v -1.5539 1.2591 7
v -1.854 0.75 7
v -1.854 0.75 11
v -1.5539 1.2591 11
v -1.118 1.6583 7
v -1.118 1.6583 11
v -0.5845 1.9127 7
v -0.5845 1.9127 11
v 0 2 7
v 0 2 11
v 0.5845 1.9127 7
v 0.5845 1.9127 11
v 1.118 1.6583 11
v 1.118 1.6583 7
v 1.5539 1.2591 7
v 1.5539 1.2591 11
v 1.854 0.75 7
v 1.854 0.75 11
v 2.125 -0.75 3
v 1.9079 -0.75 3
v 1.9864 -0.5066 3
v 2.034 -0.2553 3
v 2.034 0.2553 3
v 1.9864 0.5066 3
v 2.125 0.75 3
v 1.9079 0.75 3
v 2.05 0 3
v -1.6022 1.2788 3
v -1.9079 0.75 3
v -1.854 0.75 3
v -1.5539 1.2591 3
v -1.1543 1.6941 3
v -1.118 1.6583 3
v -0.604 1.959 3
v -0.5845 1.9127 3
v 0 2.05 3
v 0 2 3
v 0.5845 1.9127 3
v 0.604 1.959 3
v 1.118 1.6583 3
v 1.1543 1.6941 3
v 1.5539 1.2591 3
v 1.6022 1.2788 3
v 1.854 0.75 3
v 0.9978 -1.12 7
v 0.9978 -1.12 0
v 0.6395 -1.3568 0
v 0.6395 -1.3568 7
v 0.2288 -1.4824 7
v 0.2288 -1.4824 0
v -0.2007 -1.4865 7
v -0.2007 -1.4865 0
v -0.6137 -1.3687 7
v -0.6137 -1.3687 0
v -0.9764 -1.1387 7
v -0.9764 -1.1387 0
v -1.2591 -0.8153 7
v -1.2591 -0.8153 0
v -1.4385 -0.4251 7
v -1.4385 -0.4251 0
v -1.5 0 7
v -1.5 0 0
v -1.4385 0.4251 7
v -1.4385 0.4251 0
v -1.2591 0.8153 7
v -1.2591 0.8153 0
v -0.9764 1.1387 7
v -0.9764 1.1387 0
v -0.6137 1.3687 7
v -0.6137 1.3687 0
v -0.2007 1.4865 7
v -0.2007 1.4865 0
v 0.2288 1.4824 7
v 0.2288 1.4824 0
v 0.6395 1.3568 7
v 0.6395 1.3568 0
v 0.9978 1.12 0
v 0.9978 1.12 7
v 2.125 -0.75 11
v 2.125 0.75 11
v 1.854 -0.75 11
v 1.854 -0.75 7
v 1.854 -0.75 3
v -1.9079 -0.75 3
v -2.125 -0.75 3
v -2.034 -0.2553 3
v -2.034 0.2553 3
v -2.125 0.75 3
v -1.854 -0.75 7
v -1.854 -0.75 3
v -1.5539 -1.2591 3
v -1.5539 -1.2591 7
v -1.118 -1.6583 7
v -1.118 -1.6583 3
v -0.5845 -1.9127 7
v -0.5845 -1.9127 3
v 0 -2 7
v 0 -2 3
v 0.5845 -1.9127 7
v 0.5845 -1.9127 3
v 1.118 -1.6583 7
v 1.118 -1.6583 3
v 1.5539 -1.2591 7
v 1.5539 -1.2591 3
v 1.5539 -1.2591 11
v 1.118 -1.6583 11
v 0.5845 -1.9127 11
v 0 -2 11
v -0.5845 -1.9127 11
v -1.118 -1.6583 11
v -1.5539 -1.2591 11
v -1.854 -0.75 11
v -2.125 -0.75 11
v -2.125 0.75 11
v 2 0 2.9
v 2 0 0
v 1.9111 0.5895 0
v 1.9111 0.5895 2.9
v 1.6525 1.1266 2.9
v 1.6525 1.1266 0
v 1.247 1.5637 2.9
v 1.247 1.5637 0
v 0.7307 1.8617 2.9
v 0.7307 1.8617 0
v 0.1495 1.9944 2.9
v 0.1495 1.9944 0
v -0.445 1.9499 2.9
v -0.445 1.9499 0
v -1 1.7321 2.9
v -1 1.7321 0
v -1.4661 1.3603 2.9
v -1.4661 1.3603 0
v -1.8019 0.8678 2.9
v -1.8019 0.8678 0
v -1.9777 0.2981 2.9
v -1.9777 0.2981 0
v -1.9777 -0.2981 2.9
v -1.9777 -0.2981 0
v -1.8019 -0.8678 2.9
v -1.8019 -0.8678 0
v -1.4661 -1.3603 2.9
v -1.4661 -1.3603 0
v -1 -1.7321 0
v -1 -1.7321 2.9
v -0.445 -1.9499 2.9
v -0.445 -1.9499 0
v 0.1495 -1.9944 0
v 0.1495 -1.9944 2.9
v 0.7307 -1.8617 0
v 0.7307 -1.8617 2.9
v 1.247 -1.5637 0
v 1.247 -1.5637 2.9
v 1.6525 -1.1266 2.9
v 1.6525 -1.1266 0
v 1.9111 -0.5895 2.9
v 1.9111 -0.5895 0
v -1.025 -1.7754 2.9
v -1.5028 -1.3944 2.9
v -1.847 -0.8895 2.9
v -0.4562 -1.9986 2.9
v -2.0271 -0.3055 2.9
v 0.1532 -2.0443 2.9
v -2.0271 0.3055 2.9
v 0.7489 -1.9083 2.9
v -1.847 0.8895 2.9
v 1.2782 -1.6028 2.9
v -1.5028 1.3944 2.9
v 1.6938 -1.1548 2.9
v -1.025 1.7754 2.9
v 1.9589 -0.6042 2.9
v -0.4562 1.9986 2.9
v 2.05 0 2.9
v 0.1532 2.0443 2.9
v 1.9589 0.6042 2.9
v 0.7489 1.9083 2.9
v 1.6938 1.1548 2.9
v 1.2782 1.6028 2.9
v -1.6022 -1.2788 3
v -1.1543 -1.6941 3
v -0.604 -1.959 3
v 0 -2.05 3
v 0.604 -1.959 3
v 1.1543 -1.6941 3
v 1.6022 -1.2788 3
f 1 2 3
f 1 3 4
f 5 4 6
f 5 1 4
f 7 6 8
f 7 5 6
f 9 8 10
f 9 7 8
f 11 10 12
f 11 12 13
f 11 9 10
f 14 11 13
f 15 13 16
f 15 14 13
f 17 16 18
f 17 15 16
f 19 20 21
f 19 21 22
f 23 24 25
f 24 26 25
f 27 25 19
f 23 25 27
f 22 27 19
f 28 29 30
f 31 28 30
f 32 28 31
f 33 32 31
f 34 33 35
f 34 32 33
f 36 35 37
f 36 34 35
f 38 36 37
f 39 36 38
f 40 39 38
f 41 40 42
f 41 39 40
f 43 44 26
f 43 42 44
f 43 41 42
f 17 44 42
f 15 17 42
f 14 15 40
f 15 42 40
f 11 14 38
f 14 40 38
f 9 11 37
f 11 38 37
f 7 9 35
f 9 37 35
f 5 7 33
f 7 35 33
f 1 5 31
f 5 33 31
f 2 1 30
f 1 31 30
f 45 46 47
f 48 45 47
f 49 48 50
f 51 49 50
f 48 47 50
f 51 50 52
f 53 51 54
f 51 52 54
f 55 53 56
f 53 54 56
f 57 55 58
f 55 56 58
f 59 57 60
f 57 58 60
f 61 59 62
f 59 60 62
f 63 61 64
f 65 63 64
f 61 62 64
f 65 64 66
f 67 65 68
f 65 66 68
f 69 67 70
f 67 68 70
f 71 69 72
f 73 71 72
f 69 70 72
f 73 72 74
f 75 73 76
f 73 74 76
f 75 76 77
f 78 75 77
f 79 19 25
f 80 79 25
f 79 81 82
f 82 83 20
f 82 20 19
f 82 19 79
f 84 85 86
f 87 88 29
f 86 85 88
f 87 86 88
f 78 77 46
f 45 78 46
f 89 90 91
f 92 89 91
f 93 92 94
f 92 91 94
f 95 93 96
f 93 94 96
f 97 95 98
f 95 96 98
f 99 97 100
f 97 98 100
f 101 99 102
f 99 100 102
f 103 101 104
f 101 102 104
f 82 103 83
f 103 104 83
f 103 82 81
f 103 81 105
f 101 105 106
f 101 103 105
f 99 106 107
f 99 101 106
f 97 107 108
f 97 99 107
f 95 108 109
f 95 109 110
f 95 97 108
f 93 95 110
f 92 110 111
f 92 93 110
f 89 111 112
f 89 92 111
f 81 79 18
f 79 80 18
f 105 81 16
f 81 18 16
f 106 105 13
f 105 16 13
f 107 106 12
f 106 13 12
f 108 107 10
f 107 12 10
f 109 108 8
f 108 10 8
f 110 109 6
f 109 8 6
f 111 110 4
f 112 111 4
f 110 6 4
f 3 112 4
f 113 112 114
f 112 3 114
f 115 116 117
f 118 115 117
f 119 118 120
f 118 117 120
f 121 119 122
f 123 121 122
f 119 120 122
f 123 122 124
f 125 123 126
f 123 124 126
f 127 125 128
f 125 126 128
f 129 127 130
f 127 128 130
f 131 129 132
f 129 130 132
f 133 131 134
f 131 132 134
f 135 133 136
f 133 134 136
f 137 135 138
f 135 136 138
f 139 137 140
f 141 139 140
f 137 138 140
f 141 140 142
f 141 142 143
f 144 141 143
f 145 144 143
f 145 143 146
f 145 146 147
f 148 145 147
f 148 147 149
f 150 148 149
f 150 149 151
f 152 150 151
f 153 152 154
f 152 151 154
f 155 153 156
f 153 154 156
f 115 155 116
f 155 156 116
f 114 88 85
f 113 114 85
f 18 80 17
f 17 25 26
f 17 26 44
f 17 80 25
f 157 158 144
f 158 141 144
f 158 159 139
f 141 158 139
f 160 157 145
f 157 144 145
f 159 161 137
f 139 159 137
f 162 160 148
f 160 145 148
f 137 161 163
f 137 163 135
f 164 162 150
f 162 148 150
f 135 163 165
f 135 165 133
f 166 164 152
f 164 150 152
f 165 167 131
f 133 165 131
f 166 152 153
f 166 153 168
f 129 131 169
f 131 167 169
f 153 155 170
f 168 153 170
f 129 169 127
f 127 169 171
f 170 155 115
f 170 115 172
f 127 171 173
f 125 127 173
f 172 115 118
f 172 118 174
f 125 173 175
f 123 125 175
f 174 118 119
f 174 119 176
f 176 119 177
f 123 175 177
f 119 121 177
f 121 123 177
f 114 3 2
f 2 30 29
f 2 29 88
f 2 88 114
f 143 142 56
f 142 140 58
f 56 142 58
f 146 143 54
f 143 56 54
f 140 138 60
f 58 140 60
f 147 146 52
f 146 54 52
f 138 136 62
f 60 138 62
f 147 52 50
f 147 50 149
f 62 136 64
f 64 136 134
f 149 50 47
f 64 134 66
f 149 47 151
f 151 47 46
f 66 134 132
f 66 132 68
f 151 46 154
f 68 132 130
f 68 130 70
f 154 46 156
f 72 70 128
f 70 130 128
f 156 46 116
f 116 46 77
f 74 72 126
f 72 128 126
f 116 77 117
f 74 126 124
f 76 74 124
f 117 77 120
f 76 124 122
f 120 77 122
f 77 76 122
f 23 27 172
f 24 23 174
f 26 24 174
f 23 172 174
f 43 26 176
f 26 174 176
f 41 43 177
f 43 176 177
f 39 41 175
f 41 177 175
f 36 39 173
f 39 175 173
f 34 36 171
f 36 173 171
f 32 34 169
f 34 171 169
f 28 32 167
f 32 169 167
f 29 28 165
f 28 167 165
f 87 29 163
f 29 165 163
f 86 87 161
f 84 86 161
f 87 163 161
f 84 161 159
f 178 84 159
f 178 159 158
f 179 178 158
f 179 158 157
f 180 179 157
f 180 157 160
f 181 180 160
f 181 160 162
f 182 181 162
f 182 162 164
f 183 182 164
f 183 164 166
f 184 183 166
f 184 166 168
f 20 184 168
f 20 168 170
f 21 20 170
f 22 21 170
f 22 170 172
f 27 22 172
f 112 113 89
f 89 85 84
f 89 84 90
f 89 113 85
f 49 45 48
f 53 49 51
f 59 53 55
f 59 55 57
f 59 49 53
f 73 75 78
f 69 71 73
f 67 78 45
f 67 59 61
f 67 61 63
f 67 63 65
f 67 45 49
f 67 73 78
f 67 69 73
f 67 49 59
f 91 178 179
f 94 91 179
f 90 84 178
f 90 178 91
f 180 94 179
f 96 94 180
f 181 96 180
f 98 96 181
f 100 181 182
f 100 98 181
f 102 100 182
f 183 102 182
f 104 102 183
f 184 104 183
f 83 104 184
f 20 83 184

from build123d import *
from build123d.topology import SkipClean

# Parameters (mm, degrees)
SKETCH1_R           = 2
BOSS_EXTRUDE1_DEPTH = 7
SKETCH2_R           = 2.05
SKETCH2_R_2         = 2
BOSS_EXTRUDE3_DEPTH = 3
SKETCH3_R           = 2.05
SKETCH3_R_2         = 2
CUT_EXTRUDE1_DEPTH  = 2.9
BOSS_EXTRUDE4_DEPTH = 4
BOSS_EXTRUDE5_START = -8
BOSS_EXTRUDE5_DEPTH = 8


with BuildPart() as part:
    # Sketch1 → Boss-Extrude1 (new body)
    with BuildSketch(Plane.XY):
        Circle(SKETCH1_R)
        with BuildLine():
            Line((0.997797575, 1.12), (0.997797575, -1.12))
            ThreePointArc((0.997797575, -1.12), (-1.5, 0), (0.997797575, 1.12))
        make_face(mode=Mode.SUBTRACT)
    extrude(amount=BOSS_EXTRUDE1_DEPTH)

    # Sketch2 → Boss-Extrude3 (add)
    with BuildSketch(Plane.XY):
        Circle(SKETCH2_R)
        Circle(SKETCH2_R_2, mode=Mode.SUBTRACT)
    extrude(amount=BOSS_EXTRUDE3_DEPTH)

    # Sketch3 → Cut-Extrude1 (cut)
    with BuildSketch(Plane.XY):
        Circle(SKETCH3_R)
        Circle(SKETCH3_R_2, mode=Mode.SUBTRACT)
    extrude(amount=CUT_EXTRUDE1_DEPTH, mode=Mode.SUBTRACT)

    # Sketch4 → Boss-Extrude4 (add)
    with SkipClean():  # the faces are left unmerged after this step: merging them gives an invalid solid
        with BuildSketch(Plane.XY.offset(7)):
            with BuildLine():
                Line((1.854049622, 0.75), (2.125, 0.75))
                Line((2.125, 0.75), (2.125, -0.75))
                Line((2.125, -0.75), (1.854049622, -0.75))
                ThreePointArc((1.854049622, -0.75), (0, -2), (-1.854049622, -0.75))
                Line((-1.854049622, -0.75), (-2.125, -0.75))
                Line((-2.125, -0.75), (-2.125, 0.75))
                Line((-2.125, 0.75), (-1.854049622, 0.75))
                ThreePointArc((-1.854049622, 0.75), (0, 2), (1.854049622, 0.75))
            make_face()
        extrude(amount=BOSS_EXTRUDE4_DEPTH)

    # Sketch8 → Boss-Extrude5 (add)
    with BuildSketch(Plane.XY.offset(11).offset(BOSS_EXTRUDE5_START)):
        with BuildLine():
            Line((1.854049622, -0.75), (2.125, -0.75))
            Line((2.125, -0.75), (2.125, 0.75))
            Line((2.125, 0.75), (1.854049622, 0.75))
            ThreePointArc((1.854049622, 0.75), (2, 0), (1.854049622, -0.75))
        make_face()
        with BuildLine():
            Line((-2.125, -0.75), (-1.854049622, -0.75))
            ThreePointArc((-1.854049622, -0.75), (-2, 0), (-1.854049622, 0.75))
            Line((-1.854049622, 0.75), (-2.125, 0.75))
            Line((-2.125, 0.75), (-2.125, -0.75))
        make_face()
    extrude(amount=BOSS_EXTRUDE5_DEPTH)


solid = part.part
